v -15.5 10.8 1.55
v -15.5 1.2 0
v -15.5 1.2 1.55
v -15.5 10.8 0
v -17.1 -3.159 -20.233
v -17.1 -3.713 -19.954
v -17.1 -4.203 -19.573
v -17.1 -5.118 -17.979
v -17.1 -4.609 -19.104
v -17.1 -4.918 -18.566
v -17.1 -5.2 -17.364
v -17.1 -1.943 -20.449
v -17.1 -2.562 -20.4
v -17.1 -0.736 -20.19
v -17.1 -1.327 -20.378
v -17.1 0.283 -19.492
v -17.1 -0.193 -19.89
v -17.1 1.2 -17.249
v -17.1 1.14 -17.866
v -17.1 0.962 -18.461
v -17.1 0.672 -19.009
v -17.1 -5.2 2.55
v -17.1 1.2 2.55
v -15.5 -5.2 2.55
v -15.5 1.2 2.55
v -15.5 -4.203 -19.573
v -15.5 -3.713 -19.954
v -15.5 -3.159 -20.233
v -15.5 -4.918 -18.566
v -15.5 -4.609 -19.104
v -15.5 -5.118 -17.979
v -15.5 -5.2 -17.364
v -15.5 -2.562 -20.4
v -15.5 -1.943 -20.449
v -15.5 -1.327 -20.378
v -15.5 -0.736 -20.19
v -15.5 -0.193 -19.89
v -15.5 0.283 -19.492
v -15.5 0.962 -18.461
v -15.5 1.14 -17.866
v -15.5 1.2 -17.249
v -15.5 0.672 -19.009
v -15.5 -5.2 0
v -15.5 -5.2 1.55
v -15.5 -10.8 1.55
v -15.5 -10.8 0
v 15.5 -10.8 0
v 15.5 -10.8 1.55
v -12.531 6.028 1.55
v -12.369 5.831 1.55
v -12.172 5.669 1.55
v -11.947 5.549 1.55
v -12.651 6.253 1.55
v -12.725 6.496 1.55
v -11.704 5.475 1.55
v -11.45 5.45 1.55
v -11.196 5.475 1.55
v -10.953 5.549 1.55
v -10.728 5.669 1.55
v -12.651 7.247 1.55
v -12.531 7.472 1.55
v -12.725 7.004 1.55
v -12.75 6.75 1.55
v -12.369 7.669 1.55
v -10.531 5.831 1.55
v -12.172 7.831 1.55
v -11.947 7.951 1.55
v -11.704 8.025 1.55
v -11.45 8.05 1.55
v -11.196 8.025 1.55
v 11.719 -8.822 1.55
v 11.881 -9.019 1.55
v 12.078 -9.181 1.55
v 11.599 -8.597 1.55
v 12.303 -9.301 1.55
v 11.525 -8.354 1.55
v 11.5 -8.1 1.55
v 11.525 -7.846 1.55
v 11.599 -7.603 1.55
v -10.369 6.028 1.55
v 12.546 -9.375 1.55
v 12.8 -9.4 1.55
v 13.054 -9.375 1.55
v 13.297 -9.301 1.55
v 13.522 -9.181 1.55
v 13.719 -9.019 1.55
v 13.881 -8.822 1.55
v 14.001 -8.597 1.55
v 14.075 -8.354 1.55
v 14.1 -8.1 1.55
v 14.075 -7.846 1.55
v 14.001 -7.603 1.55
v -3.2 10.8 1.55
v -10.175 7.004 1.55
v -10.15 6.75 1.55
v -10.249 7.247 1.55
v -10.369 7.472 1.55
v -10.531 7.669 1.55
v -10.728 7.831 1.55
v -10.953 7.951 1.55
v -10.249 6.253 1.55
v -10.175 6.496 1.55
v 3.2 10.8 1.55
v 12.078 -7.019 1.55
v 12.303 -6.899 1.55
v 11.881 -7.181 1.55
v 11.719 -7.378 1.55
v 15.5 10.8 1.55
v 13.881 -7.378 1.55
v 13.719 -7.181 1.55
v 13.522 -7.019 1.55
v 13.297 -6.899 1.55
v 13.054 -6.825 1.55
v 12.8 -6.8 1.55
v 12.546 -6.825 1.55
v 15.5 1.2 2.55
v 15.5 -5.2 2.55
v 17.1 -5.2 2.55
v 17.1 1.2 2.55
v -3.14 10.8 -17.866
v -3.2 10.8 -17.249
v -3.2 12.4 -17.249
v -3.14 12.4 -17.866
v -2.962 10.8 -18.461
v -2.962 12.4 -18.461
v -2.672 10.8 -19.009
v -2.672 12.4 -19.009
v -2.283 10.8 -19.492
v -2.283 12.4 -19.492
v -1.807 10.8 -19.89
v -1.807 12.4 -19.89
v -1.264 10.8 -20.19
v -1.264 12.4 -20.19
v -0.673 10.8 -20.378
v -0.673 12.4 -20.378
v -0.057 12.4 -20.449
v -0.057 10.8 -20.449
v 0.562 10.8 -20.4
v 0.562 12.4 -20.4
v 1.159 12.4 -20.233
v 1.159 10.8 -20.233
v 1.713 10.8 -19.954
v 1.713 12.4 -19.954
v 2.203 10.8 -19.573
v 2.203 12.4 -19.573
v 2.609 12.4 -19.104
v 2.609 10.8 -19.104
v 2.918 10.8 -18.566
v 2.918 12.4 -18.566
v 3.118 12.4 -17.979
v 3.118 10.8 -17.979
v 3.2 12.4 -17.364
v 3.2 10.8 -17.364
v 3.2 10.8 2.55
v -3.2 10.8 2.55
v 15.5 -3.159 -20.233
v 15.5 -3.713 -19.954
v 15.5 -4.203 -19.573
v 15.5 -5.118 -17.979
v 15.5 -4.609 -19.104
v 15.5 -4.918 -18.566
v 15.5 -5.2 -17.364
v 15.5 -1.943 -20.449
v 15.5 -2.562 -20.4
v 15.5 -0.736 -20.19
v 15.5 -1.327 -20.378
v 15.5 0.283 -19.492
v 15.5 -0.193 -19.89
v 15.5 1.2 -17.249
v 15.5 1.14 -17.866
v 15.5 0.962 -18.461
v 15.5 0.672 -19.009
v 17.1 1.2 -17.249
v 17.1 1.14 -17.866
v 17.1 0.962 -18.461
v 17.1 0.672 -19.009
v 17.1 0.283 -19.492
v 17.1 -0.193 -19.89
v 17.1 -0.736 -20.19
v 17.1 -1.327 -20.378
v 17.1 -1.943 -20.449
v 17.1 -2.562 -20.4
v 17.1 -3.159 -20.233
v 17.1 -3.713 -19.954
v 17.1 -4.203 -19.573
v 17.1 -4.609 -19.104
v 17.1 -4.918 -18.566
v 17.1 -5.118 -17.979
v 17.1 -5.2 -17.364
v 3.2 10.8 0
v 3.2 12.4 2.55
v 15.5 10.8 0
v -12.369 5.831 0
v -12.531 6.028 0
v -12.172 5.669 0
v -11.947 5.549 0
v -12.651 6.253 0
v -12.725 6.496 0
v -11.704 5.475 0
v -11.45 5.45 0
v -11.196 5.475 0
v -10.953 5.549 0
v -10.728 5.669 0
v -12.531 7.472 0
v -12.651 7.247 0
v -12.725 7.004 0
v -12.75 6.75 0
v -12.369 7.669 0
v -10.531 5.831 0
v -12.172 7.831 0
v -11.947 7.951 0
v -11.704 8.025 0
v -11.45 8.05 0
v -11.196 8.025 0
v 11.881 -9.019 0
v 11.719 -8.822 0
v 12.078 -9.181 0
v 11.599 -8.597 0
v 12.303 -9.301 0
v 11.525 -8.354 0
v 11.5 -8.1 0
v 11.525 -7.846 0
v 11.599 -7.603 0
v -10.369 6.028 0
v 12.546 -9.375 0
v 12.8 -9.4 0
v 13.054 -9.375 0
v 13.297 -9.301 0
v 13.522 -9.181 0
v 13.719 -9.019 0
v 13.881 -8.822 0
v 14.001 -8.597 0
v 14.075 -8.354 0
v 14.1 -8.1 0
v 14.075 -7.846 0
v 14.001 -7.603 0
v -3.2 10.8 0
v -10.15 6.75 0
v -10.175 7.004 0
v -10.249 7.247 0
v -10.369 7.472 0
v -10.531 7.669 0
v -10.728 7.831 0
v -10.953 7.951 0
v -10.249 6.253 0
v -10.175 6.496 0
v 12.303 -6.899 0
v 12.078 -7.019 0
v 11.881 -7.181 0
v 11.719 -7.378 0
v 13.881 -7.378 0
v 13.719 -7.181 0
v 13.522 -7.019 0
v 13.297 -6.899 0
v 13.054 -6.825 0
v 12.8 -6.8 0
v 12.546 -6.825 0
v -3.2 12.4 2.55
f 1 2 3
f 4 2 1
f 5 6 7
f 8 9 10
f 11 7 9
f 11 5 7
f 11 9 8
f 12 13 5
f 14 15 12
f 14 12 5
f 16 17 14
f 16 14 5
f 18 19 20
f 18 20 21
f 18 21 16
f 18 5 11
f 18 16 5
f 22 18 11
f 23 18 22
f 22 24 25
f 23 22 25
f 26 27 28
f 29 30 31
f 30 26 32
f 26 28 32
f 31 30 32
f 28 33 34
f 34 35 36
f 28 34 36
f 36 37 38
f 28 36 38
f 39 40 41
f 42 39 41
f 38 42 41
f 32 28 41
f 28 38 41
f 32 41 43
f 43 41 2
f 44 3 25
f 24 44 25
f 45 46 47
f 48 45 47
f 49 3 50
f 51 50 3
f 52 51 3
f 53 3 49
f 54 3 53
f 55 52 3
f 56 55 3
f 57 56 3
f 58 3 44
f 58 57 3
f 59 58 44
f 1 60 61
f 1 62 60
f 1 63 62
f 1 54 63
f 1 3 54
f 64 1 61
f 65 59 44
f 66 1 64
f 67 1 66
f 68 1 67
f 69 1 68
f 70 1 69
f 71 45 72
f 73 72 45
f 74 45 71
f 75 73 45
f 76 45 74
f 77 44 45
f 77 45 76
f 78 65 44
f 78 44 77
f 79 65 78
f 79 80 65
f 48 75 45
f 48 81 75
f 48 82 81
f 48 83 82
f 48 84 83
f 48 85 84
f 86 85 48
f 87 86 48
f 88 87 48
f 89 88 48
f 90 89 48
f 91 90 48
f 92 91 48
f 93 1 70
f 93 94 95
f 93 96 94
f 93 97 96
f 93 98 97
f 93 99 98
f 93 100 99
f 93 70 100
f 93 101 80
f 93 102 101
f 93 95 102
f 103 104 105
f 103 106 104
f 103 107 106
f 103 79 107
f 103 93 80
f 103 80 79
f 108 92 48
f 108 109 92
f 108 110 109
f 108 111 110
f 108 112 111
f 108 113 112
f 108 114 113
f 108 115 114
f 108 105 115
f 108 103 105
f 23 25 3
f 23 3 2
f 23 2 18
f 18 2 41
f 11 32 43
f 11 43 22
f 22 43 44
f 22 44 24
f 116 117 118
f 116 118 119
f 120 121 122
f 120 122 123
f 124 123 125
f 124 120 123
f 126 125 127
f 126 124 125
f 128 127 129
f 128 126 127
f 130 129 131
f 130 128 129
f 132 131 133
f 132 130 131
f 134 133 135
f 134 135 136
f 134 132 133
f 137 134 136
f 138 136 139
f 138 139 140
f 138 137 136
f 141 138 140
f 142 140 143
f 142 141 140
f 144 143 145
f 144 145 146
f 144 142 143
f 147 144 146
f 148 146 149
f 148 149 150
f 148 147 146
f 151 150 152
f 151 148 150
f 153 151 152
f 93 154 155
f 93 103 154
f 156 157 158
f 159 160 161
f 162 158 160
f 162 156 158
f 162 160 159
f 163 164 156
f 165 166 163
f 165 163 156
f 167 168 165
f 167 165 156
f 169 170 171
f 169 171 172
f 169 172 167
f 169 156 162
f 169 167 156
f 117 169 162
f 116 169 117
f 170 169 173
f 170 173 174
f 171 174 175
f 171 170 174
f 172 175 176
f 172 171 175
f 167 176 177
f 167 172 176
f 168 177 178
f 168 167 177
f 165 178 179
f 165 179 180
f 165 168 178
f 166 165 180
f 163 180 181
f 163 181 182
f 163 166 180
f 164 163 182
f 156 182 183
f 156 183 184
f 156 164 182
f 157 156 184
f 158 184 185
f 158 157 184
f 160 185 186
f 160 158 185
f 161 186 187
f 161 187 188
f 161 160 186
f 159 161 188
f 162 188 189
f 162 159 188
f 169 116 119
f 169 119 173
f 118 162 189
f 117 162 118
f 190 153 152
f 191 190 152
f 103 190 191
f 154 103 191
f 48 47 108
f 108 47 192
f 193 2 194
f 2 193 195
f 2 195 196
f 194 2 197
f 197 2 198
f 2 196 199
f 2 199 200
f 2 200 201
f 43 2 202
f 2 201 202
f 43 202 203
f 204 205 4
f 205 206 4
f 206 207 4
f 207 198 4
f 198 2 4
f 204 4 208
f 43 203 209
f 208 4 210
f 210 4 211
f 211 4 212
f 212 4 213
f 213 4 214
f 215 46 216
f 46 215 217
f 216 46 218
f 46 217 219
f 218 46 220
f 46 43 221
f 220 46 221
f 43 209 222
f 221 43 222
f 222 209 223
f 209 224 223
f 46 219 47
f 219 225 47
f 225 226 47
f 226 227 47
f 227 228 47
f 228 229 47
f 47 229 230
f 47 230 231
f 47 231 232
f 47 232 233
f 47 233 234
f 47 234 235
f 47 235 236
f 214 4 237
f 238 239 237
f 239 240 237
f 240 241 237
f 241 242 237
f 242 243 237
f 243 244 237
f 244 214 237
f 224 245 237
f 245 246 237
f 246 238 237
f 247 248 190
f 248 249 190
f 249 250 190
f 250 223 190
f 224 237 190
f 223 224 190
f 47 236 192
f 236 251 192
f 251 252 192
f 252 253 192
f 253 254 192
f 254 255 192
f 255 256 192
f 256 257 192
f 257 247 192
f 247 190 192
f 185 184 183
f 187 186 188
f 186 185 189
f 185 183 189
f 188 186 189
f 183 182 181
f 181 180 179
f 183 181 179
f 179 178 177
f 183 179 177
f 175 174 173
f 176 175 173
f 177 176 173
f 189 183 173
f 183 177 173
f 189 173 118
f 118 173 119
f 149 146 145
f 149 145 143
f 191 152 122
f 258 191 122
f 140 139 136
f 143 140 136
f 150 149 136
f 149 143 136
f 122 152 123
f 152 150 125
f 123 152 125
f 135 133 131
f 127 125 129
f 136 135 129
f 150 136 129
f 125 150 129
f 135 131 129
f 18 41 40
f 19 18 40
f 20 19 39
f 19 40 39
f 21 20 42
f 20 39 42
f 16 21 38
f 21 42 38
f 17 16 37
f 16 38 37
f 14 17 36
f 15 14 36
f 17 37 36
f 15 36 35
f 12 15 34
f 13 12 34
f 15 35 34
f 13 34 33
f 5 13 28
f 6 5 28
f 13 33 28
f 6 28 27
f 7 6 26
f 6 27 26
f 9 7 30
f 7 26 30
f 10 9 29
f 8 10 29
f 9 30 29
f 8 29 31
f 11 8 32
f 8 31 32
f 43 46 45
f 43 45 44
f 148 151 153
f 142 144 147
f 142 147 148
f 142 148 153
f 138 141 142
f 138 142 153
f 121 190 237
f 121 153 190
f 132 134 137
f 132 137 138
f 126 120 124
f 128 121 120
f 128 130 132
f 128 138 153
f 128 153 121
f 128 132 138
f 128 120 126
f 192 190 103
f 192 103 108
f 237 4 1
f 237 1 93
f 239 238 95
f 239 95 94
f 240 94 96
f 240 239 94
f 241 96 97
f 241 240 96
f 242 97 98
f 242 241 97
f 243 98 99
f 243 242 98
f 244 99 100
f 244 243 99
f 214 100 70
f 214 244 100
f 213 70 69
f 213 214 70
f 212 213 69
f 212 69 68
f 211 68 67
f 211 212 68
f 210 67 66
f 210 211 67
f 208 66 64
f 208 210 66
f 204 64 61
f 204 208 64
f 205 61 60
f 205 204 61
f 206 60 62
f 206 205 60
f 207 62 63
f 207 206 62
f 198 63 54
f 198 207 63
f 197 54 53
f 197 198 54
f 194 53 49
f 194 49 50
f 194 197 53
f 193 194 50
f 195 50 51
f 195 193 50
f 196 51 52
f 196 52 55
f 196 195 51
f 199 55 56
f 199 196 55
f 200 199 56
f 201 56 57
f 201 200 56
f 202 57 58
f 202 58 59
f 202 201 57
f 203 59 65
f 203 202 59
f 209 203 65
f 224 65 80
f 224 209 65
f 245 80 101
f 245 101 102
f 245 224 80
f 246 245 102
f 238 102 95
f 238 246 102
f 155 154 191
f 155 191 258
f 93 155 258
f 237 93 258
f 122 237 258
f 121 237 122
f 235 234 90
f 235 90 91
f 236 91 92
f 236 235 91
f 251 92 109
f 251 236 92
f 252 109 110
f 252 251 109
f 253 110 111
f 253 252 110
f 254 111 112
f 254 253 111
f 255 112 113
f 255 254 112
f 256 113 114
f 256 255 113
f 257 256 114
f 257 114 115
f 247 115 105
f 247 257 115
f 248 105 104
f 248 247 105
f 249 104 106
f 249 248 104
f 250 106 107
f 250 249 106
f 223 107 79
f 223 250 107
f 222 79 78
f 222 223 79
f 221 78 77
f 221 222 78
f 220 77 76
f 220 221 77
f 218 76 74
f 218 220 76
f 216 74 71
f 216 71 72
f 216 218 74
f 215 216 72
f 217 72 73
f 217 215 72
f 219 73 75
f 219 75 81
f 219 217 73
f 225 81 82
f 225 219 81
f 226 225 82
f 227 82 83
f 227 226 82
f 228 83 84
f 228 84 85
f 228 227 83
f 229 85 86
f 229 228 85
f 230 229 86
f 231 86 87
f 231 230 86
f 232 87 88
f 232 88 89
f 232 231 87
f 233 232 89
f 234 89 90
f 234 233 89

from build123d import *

# Parameters (mm, degrees)
SKETCH1_W           = 31
SKETCH1_H           = 21.6
SKETCH1_R           = 1.3
BOSS_EXTRUDE1_DEPTH = 1.55
BOSS_EXTRUDE2_START = 15.5
BOSS_EXTRUDE2_DEPTH = 1.6
BOSS_EXTRUDE3_START = -15.5
BOSS_EXTRUDE3_DEPTH = 1.6
BOSS_EXTRUDE4_DEPTH = 1.6


with BuildPart() as part:
    # Sketch1 → Boss-Extrude1 (new body)
    with BuildSketch(Plane.XY):
        Rectangle(SKETCH1_W, SKETCH1_H)
        with Locations((12.8, -8.1)):
            Circle(SKETCH1_R, mode=Mode.SUBTRACT)
        with Locations((-11.45, 6.75)):
            Circle(SKETCH1_R, mode=Mode.SUBTRACT)
    extrude(amount=BOSS_EXTRUDE1_DEPTH)

    # Sketch2<2> → Boss-Extrude3 (add)
    with BuildSketch(Plane(origin=(0, 0, 0), x_dir=(0, 0, -1), z_dir=(1, 0, 0)).offset(BOSS_EXTRUDE3_START)):
        with BuildLine():
            Line((-2.55, 1.2), (17.248963494, 1.2))
            ThreePointArc((17.248963494, 1.2), (20.449481705, -1.943435359), (17.364147134, -5.2))
            Line((17.364147134, -5.2), (-2.55, -5.2))
            Line((-2.55, -5.2), (-2.55, 1.2))
        make_face()
    extrude(amount=-BOSS_EXTRUDE3_DEPTH)

    # Sketch3 → Boss-Extrude4 (add)
    with BuildSketch(Plane(origin=(0, 10.8, 0), x_dir=(1, 0, 0), z_dir=(0, 1, 0))):
        with BuildLine():
            Line((-3.2, -2.55), (-3.2, 17.248963494))
            ThreePointArc((-3.2, 17.248963494), (-0.056564641, 20.449481705), (3.2, 17.364147134))
            Line((3.2, 17.364147134), (3.2, -2.55))
            Line((3.2, -2.55), (-3.2, -2.55))
        make_face()
    extrude(amount=BOSS_EXTRUDE4_DEPTH)


with BuildPart() as body_2:
    # Sketch2 → Boss-Extrude2 (new body)
    with BuildSketch(Plane(origin=(0, 0, 0), x_dir=(0, 0, -1), z_dir=(1, 0, 0)).offset(BOSS_EXTRUDE2_START)):
        with BuildLine():
            Line((-2.55, 1.2), (17.248963494, 1.2))
            ThreePointArc((17.248963494, 1.2), (20.449481705, -1.943435359), (17.364147134, -5.2))
            Line((17.364147134, -5.2), (-2.55, -5.2))
            Line((-2.55, -5.2), (-2.55, 1.2))
        make_face()
    extrude(amount=BOSS_EXTRUDE2_DEPTH)


solid = Compound([part.part, body_2.part])
